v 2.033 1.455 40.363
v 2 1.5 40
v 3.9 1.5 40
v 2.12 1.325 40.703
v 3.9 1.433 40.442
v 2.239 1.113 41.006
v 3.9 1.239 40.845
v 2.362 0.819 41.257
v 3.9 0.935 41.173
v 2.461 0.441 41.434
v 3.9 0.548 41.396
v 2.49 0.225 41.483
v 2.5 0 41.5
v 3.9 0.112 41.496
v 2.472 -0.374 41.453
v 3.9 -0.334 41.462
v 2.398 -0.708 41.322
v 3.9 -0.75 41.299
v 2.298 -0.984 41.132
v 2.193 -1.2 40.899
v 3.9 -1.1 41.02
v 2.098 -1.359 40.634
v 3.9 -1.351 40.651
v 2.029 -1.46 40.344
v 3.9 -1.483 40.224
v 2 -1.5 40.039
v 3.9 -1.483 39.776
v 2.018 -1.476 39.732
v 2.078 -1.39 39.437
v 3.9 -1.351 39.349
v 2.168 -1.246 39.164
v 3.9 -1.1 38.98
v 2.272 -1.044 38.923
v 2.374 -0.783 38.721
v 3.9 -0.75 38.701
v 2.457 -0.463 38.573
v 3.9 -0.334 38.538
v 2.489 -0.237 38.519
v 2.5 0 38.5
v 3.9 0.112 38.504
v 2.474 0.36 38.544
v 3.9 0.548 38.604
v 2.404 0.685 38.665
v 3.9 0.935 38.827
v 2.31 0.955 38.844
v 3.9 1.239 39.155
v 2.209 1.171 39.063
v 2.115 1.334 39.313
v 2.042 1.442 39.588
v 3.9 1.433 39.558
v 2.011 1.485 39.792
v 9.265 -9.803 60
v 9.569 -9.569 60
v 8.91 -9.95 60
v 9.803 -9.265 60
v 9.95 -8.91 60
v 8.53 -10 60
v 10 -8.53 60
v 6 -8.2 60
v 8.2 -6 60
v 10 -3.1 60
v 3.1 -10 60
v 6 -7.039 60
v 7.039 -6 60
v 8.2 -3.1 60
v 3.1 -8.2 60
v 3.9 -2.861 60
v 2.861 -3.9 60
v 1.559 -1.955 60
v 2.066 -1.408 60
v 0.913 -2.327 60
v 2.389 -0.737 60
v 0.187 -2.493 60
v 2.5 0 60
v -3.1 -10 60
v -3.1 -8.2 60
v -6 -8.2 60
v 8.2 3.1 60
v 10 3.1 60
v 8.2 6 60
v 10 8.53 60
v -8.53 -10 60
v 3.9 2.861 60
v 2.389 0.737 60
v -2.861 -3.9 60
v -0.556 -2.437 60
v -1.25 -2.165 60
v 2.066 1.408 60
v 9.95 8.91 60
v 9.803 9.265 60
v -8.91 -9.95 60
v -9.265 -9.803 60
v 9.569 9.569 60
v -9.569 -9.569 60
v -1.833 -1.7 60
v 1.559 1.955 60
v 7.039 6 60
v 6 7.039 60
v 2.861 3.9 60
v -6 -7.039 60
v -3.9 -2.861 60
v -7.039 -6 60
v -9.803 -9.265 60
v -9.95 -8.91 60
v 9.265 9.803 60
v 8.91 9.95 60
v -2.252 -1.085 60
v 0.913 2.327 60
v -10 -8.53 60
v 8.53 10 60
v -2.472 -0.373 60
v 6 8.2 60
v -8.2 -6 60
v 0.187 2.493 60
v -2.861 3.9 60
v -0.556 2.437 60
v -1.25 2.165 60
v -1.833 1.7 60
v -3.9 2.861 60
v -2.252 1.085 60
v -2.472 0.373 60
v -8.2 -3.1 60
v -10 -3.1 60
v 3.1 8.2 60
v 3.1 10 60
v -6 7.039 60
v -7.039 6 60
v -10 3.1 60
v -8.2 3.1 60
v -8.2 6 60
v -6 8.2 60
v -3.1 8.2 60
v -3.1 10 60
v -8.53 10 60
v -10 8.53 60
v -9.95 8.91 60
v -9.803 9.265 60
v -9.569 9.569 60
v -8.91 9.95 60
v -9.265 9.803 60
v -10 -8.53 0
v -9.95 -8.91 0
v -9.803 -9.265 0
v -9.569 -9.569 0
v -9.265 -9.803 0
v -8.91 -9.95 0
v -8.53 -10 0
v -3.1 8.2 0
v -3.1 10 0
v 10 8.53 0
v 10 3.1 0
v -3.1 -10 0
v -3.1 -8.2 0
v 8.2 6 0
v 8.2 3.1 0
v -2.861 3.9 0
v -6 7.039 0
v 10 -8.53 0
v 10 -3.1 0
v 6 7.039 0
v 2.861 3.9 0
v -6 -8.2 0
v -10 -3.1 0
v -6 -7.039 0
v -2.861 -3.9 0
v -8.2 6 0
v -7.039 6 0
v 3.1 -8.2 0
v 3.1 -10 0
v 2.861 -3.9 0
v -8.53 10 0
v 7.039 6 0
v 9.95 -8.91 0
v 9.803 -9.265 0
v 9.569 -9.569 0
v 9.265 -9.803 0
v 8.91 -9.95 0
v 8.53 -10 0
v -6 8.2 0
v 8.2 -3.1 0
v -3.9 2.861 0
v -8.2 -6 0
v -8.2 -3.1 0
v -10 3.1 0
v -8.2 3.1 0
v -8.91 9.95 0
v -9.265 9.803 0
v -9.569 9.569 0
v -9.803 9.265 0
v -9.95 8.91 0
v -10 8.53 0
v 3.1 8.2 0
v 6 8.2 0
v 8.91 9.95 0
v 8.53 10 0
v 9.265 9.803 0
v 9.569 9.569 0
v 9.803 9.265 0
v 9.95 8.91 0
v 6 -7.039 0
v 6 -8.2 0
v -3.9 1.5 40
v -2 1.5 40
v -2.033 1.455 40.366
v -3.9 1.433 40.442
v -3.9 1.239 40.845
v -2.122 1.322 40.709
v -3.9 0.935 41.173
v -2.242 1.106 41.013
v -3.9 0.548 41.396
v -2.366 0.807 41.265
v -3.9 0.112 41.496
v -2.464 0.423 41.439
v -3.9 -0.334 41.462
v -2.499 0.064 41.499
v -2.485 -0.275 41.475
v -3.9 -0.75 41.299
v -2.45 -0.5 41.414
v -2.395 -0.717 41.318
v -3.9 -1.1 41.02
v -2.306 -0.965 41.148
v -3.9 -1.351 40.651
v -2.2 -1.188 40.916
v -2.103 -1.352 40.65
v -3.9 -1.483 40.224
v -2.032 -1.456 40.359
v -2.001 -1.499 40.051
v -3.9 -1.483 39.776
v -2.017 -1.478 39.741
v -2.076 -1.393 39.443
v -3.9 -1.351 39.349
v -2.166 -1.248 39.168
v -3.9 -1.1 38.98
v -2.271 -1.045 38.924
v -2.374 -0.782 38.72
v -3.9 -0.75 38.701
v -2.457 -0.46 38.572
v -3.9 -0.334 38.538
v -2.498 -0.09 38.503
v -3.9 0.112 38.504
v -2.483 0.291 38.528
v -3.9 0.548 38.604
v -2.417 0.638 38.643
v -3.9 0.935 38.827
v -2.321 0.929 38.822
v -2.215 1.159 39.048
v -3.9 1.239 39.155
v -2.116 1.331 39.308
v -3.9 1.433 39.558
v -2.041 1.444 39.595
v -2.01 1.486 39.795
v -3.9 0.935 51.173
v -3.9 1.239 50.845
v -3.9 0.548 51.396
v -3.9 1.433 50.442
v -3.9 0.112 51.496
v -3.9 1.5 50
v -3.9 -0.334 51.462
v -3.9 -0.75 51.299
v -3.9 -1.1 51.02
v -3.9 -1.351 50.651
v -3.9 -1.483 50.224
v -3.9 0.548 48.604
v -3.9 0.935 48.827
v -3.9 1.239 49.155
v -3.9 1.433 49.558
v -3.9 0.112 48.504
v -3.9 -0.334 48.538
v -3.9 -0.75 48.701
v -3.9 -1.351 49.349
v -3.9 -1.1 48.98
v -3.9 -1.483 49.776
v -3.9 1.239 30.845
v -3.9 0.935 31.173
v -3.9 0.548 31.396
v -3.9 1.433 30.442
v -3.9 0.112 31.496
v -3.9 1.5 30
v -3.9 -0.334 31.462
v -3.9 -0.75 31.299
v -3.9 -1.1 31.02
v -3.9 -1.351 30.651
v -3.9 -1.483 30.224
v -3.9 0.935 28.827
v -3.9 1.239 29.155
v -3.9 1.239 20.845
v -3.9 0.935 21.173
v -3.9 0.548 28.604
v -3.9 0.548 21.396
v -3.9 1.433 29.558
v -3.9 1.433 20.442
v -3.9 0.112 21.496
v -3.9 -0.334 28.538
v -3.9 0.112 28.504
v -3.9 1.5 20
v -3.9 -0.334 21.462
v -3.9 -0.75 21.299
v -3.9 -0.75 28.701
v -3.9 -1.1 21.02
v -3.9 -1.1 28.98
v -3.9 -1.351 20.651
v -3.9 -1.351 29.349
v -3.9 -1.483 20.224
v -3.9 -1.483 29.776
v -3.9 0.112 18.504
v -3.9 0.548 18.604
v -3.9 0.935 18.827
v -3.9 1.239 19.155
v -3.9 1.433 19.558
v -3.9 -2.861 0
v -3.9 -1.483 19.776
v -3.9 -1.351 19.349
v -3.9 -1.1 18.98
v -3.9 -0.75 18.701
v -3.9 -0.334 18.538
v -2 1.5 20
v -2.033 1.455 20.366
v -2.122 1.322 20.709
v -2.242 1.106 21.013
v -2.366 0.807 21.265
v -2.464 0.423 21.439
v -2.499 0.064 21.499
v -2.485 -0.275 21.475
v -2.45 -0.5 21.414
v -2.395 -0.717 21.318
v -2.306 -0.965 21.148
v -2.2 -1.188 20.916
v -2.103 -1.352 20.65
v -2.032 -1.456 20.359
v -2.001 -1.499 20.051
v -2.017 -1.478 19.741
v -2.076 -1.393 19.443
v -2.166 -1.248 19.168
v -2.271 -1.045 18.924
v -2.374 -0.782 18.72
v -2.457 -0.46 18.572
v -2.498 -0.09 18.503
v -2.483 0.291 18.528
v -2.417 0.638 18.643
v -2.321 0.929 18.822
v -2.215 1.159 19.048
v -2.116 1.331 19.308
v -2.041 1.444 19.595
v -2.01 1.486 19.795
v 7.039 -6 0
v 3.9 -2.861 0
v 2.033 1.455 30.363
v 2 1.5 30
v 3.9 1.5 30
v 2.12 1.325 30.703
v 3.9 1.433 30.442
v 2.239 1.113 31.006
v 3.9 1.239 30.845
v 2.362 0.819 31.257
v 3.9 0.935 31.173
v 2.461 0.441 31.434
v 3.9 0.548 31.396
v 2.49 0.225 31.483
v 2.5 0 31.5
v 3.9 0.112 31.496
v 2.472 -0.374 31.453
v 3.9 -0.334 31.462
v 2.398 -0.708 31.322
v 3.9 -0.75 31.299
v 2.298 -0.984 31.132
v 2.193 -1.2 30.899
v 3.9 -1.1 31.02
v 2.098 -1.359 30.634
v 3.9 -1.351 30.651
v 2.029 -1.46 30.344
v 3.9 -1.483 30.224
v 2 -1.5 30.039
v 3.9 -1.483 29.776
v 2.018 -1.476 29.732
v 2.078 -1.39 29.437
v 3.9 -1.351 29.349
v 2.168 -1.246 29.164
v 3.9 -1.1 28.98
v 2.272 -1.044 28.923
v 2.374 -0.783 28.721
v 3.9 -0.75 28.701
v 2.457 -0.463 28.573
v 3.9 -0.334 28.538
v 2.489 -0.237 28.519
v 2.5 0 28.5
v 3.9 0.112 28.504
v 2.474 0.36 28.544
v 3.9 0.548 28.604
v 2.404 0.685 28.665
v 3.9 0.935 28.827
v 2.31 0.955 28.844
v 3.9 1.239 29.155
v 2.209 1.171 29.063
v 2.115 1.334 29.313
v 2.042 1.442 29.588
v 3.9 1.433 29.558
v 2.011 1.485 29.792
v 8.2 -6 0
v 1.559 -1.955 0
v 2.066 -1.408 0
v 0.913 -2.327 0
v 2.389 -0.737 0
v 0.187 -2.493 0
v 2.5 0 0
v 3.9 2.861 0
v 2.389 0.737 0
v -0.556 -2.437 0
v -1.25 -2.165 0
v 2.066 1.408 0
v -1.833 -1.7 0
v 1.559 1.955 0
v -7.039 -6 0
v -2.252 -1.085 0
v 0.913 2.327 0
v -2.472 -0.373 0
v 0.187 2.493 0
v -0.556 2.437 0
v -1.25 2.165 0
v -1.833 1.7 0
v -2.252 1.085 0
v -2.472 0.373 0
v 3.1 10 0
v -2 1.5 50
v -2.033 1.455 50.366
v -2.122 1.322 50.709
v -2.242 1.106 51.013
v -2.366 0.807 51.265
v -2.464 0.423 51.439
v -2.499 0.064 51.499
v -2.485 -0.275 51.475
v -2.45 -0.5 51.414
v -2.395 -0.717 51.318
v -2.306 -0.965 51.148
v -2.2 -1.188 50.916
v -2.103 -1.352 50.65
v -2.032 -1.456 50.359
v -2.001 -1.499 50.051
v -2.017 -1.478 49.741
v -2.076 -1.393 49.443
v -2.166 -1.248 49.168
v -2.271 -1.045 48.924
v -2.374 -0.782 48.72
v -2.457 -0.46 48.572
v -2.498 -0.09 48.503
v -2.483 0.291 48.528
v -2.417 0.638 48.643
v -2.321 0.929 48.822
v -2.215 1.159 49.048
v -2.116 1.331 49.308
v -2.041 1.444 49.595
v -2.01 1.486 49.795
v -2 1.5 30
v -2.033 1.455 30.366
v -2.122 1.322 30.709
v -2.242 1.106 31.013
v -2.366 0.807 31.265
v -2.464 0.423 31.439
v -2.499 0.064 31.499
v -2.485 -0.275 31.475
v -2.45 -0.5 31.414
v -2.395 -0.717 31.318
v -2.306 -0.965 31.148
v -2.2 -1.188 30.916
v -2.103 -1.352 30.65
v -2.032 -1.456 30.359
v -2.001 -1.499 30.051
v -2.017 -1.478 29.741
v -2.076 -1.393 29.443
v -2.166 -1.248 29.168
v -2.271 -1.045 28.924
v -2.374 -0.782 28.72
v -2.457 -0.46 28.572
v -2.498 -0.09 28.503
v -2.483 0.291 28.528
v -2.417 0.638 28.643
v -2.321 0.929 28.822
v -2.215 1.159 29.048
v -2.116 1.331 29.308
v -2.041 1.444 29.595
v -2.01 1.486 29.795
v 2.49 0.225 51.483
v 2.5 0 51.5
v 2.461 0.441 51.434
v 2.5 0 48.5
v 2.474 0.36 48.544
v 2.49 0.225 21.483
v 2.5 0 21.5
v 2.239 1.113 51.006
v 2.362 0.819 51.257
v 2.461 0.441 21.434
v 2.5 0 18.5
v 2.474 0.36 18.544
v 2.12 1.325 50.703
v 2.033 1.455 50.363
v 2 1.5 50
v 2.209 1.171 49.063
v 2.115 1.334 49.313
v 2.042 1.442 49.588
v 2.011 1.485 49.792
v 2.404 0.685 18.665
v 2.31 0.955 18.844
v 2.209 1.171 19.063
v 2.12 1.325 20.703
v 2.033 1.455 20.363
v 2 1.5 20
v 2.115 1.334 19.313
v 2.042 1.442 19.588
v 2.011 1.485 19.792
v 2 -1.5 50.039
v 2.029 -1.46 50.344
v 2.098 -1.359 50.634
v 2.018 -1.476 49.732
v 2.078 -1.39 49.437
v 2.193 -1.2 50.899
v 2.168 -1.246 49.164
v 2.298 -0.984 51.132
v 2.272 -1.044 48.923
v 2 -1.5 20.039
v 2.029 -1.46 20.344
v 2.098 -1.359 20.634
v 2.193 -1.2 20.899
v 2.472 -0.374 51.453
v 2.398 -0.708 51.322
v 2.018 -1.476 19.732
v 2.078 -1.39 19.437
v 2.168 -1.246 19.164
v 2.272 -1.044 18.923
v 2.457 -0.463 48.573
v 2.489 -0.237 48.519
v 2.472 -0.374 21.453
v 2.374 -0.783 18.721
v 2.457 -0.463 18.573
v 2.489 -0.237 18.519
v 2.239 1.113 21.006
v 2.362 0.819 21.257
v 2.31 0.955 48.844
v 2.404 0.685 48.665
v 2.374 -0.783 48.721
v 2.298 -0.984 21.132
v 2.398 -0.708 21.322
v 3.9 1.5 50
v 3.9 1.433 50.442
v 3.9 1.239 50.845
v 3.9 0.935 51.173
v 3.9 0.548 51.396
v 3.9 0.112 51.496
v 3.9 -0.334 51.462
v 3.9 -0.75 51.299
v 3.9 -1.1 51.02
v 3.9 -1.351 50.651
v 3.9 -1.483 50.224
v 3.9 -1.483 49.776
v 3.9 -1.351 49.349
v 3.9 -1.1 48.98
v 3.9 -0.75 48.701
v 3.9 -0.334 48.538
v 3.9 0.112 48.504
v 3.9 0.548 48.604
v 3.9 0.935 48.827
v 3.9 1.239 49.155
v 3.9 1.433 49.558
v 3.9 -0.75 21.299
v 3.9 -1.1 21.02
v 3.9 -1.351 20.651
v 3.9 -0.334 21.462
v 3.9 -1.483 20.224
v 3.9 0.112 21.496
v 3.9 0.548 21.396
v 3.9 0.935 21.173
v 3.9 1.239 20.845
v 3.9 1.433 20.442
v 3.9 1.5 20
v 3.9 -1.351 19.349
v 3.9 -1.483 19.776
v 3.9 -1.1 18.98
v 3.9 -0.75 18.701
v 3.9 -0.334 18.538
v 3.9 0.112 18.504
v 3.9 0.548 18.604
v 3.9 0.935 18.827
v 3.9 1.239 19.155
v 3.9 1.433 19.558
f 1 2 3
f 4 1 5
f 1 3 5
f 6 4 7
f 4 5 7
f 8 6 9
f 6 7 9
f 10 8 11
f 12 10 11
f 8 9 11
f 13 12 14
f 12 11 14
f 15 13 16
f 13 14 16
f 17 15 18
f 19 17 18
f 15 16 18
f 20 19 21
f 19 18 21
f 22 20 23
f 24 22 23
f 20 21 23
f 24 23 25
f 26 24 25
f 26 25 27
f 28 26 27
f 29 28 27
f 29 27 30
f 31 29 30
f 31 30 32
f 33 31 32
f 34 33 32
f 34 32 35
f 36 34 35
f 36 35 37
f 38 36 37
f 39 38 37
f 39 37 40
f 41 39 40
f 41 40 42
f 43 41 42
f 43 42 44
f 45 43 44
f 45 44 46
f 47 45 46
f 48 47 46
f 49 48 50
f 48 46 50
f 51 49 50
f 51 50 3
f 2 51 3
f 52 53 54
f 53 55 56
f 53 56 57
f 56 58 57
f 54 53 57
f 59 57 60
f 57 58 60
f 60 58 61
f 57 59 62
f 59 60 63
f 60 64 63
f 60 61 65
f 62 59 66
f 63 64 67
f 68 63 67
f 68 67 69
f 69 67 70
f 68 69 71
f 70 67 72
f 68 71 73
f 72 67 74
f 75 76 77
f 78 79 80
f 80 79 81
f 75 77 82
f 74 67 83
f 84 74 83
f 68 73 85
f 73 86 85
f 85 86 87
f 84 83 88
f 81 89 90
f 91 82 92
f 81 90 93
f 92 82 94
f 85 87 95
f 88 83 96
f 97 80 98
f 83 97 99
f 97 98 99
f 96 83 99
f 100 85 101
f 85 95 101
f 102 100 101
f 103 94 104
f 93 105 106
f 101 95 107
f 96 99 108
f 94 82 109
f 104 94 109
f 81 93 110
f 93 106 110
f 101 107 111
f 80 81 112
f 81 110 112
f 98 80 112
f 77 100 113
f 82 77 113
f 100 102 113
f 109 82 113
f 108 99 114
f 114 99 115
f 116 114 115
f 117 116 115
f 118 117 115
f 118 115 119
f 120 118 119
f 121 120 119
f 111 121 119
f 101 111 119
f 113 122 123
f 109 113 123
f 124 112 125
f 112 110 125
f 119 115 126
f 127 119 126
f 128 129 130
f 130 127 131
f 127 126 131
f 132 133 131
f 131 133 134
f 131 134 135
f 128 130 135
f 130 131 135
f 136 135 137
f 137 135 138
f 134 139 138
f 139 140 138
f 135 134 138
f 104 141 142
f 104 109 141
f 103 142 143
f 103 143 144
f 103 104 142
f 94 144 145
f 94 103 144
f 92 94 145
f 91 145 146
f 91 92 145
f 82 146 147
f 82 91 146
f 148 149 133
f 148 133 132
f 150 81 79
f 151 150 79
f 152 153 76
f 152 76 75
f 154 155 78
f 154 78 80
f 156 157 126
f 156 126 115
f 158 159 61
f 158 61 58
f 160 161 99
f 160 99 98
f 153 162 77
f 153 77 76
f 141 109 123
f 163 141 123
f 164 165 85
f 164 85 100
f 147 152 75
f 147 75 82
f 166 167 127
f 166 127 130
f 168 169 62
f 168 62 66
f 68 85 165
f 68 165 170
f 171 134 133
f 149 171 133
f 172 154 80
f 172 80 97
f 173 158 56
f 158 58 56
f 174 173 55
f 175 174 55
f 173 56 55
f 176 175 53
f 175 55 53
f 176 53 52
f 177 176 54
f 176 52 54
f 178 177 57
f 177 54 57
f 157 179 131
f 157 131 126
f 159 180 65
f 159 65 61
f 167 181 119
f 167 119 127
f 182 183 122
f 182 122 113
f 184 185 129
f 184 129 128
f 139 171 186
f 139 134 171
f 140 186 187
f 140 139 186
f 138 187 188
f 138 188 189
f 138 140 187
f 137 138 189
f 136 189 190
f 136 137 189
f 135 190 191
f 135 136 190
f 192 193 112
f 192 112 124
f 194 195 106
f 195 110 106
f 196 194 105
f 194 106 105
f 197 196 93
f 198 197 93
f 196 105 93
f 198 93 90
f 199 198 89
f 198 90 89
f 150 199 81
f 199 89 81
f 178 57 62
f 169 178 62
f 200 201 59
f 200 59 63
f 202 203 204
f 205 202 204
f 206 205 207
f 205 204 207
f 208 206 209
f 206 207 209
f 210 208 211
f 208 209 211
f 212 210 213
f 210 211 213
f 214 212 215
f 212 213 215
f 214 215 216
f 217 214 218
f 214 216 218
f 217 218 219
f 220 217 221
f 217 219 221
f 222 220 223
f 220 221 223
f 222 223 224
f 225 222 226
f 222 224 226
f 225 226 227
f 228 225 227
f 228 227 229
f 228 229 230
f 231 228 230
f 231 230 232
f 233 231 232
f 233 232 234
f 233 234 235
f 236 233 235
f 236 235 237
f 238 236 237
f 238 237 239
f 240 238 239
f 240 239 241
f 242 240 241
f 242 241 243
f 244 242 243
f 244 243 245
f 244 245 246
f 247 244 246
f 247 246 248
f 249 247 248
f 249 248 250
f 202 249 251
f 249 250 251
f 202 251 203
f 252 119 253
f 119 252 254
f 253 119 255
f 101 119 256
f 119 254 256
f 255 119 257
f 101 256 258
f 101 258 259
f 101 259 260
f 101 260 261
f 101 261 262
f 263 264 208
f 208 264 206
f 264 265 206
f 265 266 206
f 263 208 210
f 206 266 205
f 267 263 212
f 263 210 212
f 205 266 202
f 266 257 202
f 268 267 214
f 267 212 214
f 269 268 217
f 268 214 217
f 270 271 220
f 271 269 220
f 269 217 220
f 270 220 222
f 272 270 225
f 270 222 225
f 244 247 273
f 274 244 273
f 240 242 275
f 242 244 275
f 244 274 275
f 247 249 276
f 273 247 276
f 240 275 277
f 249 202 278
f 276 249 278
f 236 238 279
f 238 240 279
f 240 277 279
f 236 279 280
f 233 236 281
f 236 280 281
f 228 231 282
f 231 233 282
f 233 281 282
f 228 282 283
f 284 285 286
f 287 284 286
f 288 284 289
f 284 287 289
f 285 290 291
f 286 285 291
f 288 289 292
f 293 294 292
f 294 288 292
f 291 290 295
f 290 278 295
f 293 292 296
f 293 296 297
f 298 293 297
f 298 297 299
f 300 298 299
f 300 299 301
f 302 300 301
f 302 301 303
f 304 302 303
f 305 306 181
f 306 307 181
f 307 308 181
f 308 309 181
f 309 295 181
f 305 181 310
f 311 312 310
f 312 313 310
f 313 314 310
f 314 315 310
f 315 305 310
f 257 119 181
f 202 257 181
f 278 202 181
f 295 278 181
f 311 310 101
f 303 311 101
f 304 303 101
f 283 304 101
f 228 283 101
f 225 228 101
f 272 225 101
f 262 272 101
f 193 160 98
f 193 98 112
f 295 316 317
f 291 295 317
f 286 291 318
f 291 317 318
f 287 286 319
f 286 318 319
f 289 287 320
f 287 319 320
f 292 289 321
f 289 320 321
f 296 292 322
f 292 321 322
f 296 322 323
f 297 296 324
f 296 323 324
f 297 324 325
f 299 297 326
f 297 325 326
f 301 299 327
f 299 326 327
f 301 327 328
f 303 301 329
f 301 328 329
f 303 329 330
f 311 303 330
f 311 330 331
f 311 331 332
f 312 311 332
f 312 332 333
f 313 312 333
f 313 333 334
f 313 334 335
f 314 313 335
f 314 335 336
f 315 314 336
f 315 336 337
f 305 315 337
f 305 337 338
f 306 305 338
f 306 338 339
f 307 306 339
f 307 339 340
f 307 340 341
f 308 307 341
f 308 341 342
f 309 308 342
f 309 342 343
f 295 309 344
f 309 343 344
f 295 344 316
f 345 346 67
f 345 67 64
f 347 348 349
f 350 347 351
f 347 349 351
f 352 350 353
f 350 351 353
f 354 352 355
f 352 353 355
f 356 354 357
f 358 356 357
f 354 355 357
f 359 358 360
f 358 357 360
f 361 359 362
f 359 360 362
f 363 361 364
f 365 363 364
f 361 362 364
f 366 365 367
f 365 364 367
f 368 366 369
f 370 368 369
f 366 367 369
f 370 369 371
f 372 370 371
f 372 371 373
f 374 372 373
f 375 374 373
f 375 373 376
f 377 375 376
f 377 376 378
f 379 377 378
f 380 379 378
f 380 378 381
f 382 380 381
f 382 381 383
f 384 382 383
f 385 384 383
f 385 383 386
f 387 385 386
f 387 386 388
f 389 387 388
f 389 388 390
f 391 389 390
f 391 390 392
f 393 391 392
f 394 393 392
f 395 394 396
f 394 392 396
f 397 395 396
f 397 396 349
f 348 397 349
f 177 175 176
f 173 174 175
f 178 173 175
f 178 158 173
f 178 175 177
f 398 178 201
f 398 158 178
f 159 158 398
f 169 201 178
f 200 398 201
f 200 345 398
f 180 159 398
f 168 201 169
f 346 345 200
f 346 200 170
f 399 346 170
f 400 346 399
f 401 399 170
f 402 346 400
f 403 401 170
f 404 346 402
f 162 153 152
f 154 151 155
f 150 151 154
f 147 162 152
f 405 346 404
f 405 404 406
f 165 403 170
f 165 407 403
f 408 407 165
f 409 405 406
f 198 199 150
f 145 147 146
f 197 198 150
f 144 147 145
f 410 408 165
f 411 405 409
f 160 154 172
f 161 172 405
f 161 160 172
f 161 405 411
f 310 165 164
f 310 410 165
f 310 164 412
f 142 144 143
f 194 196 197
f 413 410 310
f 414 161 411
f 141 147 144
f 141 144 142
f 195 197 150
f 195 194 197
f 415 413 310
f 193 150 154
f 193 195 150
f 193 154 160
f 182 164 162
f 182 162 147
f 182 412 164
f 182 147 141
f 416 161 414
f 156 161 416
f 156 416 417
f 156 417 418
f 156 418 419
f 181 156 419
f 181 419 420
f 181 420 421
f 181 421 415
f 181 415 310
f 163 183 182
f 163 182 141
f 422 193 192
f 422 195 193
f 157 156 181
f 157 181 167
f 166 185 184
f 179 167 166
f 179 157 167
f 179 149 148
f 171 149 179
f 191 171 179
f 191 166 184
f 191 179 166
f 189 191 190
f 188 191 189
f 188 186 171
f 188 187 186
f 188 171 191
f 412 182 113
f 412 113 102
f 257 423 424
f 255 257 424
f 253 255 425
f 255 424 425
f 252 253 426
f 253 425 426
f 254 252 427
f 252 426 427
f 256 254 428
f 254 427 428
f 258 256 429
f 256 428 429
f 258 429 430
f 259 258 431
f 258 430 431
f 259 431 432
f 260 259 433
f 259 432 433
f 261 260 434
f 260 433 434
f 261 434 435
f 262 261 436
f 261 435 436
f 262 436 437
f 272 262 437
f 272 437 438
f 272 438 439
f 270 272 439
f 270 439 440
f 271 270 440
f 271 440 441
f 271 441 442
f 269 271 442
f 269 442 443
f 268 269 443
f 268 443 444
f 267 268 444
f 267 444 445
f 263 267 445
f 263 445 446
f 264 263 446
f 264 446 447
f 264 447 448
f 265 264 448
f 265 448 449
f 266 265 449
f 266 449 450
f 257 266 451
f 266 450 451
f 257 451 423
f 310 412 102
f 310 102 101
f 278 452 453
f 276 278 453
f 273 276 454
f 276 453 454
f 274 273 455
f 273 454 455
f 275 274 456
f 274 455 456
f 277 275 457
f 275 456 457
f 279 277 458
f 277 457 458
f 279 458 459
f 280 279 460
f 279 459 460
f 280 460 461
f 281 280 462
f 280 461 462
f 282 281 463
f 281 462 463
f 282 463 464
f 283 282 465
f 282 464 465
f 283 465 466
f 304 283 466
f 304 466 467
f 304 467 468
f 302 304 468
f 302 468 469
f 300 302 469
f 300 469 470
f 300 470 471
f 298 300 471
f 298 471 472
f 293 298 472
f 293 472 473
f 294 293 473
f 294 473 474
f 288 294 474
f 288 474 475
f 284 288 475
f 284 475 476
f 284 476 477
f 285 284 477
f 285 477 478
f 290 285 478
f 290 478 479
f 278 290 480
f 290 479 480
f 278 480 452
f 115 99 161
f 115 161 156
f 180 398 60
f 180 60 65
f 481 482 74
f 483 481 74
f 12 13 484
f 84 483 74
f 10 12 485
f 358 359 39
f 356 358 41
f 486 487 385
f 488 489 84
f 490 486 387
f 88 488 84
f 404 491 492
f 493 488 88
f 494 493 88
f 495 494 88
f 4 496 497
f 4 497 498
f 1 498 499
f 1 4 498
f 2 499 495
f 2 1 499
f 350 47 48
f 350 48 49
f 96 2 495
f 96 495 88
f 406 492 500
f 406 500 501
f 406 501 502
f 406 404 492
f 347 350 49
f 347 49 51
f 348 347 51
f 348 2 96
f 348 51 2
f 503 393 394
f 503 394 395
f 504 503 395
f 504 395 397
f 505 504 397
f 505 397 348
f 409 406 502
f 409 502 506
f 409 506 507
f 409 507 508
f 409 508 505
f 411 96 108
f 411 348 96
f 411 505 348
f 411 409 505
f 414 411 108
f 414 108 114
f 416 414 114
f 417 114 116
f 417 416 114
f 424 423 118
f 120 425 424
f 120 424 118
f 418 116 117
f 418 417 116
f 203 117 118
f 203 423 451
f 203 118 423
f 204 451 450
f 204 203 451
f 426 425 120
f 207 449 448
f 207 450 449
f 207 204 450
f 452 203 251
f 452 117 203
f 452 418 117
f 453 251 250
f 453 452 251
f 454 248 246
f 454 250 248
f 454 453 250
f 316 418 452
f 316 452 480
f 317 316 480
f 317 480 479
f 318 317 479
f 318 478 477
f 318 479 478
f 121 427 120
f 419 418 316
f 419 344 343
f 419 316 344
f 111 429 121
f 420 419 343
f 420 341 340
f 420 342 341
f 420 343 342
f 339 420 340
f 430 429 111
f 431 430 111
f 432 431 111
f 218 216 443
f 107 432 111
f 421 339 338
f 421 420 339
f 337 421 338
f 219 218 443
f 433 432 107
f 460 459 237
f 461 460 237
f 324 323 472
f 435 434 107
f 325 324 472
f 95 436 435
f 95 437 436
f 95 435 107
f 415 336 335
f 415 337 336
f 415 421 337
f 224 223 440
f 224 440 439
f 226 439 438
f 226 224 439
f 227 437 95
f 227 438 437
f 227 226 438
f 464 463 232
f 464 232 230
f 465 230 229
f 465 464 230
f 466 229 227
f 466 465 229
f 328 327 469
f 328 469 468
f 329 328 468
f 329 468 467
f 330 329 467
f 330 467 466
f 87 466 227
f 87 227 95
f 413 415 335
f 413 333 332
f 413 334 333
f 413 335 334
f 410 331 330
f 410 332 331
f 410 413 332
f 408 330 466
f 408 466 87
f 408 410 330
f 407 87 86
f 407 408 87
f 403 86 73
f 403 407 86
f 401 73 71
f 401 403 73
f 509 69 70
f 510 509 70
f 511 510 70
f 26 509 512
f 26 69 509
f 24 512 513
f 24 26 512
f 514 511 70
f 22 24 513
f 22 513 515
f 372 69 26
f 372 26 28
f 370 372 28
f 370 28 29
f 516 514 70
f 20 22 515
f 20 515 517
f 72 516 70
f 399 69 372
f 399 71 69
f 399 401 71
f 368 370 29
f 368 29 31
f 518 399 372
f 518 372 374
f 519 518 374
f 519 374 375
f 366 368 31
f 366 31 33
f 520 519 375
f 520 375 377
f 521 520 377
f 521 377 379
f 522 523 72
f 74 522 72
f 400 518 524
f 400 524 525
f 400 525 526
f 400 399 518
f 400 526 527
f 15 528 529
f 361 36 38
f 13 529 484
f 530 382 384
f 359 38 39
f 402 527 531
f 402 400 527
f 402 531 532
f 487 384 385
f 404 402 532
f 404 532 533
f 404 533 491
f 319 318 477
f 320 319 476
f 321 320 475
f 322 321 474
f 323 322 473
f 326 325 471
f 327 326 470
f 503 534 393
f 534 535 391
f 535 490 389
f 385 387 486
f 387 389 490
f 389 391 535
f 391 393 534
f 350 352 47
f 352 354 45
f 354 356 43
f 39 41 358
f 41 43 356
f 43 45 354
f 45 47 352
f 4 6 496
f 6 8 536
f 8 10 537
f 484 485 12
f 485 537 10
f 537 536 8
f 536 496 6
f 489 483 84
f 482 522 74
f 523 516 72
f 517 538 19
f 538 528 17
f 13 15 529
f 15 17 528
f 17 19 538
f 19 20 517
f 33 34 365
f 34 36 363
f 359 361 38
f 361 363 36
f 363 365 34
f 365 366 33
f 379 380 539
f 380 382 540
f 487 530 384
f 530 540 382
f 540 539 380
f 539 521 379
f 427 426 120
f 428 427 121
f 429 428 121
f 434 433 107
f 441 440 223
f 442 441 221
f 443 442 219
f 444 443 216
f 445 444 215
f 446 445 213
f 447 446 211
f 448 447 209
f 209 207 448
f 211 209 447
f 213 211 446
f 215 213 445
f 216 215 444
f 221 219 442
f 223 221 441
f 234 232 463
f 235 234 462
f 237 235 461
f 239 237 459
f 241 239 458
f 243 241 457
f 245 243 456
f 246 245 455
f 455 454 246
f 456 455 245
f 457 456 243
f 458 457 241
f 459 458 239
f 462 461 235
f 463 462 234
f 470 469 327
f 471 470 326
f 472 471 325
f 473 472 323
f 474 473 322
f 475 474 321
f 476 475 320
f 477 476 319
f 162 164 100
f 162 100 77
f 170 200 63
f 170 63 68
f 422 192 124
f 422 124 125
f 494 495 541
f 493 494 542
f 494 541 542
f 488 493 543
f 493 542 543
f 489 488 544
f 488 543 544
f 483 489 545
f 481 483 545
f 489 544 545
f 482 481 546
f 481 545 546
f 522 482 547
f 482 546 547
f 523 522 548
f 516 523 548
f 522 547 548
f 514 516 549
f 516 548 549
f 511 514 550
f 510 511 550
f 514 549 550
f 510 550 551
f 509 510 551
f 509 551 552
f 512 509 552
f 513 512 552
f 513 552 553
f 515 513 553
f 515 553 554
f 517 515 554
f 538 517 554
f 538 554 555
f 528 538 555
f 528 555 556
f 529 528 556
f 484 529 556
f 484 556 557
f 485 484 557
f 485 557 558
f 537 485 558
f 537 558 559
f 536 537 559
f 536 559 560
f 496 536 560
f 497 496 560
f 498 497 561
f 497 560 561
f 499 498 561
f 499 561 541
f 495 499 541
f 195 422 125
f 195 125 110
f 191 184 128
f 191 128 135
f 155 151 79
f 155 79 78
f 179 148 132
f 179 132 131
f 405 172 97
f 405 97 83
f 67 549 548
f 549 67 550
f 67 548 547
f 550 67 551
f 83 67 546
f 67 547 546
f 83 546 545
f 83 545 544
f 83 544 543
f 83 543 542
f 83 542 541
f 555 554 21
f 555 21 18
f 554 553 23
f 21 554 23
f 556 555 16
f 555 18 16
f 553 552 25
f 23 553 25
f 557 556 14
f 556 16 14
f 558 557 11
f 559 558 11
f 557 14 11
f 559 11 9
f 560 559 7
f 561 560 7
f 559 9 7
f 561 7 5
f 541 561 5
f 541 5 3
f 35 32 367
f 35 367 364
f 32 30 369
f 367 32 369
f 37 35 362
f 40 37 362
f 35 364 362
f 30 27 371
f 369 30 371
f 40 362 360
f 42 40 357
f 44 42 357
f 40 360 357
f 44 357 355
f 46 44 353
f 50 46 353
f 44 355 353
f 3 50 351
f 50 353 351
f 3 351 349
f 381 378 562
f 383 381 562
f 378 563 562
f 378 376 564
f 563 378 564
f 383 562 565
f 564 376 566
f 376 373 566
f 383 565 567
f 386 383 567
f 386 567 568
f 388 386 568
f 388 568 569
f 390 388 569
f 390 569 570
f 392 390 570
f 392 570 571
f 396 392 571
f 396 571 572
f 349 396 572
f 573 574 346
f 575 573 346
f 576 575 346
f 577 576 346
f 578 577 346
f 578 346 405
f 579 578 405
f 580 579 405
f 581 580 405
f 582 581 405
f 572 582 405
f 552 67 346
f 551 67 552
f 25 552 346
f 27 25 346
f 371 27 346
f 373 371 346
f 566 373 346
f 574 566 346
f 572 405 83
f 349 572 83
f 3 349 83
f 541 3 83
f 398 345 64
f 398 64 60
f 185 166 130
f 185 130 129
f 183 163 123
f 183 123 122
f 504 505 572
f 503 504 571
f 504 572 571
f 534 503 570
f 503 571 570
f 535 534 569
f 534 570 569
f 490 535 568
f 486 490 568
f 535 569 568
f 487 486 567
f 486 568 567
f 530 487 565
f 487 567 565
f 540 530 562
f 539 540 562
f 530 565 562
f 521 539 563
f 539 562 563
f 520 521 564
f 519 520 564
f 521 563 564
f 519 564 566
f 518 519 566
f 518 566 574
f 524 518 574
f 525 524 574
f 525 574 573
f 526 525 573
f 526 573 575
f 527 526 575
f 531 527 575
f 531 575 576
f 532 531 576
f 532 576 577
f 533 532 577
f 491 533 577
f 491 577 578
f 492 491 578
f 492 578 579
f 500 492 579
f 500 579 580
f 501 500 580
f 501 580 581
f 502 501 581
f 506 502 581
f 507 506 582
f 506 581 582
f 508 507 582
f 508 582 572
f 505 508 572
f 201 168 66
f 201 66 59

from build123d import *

# Parameters (mm, degrees)
SKETCH1_R           = 2.5
BOSS_EXTRUDE1_DEPTH = 60
FILLET1_R           = 1.47
SKETCH2_R           = 1.5
CUT_EXTRUDE1_DEPTH  = 63.395592793


with BuildPart() as part:
    # Sketch1 → Boss-Extrude1 (new body)
    with BuildSketch(Plane.XY):
        Polygon((2.860553032, 3.9), (6, 7.039446968), (6, 8.2), (3.1, 8.2), (3.1, 10), (10, 10), (10, 3.1), (8.2, 3.1), (8.2, 6), (7.039446968, 6), (3.9, 2.860553032), (3.9, 0), (3.9, -2.860553032), (7.039446968, -6), (8.2, -6), (8.2, -3.1), (10, -3.1), (10, -10), (3.1, -10), (3.1, -8.2), (6, -8.2), (6, -7.039446968), (2.860553032, -3.9), (0, -3.9), (-2.860553032, -3.9), (-6, -7.039446968), (-6, -8.2), (-3.1, -8.2), (-3.1, -10), (-10, -10), (-10, -3.1), (-8.2, -3.1), (-8.2, -6), (-7.039446968, -6), (-3.9, -2.860553032), (-3.9, 0), (-3.9, 2.860553032), (-7.039446968, 6), (-8.2, 6), (-8.2, 3.1), (-10, 3.1), (-10, 10), (-3.1, 10), (-3.1, 8.2), (-6, 8.2), (-6, 7.039446968), (-2.860553032, 3.9), (0, 3.9), align=None)
        Circle(SKETCH1_R, mode=Mode.SUBTRACT)
    extrude(amount=BOSS_EXTRUDE1_DEPTH)

    # Fillet1
    fillet1_edges = [part.edges().sort_by_distance(p)[0] for p in [
        (10, -10, 30),
        (-10, -10, 30),
        (-10, 10, 30),
        (10, 10, 30),
    ]]
    fillet(fillet1_edges, radius=FILLET1_R)

    # Sketch2 → Cut-Extrude1 (cut, through all)
    with BuildSketch(Plane(origin=(3.9, 0, 0), x_dir=(0, 0, -1), z_dir=(1, 0, 0))):
        with Locations(Location((-50, 0, 0), (0, 0, 90))):
            Circle(SKETCH2_R)
        with Locations(Location((-40, 0, 0), (0, 0, 90))):
            Circle(SKETCH2_R)
        with Locations(Location((-30, 0, 0), (0, 0, 90))):
            Circle(SKETCH2_R)
        with Locations(Location((-20, 0, 0), (0, 0, 90))):
            Circle(SKETCH2_R)
    extrude(amount=-CUT_EXTRUDE1_DEPTH, mode=Mode.SUBTRACT)


solid = part.part
